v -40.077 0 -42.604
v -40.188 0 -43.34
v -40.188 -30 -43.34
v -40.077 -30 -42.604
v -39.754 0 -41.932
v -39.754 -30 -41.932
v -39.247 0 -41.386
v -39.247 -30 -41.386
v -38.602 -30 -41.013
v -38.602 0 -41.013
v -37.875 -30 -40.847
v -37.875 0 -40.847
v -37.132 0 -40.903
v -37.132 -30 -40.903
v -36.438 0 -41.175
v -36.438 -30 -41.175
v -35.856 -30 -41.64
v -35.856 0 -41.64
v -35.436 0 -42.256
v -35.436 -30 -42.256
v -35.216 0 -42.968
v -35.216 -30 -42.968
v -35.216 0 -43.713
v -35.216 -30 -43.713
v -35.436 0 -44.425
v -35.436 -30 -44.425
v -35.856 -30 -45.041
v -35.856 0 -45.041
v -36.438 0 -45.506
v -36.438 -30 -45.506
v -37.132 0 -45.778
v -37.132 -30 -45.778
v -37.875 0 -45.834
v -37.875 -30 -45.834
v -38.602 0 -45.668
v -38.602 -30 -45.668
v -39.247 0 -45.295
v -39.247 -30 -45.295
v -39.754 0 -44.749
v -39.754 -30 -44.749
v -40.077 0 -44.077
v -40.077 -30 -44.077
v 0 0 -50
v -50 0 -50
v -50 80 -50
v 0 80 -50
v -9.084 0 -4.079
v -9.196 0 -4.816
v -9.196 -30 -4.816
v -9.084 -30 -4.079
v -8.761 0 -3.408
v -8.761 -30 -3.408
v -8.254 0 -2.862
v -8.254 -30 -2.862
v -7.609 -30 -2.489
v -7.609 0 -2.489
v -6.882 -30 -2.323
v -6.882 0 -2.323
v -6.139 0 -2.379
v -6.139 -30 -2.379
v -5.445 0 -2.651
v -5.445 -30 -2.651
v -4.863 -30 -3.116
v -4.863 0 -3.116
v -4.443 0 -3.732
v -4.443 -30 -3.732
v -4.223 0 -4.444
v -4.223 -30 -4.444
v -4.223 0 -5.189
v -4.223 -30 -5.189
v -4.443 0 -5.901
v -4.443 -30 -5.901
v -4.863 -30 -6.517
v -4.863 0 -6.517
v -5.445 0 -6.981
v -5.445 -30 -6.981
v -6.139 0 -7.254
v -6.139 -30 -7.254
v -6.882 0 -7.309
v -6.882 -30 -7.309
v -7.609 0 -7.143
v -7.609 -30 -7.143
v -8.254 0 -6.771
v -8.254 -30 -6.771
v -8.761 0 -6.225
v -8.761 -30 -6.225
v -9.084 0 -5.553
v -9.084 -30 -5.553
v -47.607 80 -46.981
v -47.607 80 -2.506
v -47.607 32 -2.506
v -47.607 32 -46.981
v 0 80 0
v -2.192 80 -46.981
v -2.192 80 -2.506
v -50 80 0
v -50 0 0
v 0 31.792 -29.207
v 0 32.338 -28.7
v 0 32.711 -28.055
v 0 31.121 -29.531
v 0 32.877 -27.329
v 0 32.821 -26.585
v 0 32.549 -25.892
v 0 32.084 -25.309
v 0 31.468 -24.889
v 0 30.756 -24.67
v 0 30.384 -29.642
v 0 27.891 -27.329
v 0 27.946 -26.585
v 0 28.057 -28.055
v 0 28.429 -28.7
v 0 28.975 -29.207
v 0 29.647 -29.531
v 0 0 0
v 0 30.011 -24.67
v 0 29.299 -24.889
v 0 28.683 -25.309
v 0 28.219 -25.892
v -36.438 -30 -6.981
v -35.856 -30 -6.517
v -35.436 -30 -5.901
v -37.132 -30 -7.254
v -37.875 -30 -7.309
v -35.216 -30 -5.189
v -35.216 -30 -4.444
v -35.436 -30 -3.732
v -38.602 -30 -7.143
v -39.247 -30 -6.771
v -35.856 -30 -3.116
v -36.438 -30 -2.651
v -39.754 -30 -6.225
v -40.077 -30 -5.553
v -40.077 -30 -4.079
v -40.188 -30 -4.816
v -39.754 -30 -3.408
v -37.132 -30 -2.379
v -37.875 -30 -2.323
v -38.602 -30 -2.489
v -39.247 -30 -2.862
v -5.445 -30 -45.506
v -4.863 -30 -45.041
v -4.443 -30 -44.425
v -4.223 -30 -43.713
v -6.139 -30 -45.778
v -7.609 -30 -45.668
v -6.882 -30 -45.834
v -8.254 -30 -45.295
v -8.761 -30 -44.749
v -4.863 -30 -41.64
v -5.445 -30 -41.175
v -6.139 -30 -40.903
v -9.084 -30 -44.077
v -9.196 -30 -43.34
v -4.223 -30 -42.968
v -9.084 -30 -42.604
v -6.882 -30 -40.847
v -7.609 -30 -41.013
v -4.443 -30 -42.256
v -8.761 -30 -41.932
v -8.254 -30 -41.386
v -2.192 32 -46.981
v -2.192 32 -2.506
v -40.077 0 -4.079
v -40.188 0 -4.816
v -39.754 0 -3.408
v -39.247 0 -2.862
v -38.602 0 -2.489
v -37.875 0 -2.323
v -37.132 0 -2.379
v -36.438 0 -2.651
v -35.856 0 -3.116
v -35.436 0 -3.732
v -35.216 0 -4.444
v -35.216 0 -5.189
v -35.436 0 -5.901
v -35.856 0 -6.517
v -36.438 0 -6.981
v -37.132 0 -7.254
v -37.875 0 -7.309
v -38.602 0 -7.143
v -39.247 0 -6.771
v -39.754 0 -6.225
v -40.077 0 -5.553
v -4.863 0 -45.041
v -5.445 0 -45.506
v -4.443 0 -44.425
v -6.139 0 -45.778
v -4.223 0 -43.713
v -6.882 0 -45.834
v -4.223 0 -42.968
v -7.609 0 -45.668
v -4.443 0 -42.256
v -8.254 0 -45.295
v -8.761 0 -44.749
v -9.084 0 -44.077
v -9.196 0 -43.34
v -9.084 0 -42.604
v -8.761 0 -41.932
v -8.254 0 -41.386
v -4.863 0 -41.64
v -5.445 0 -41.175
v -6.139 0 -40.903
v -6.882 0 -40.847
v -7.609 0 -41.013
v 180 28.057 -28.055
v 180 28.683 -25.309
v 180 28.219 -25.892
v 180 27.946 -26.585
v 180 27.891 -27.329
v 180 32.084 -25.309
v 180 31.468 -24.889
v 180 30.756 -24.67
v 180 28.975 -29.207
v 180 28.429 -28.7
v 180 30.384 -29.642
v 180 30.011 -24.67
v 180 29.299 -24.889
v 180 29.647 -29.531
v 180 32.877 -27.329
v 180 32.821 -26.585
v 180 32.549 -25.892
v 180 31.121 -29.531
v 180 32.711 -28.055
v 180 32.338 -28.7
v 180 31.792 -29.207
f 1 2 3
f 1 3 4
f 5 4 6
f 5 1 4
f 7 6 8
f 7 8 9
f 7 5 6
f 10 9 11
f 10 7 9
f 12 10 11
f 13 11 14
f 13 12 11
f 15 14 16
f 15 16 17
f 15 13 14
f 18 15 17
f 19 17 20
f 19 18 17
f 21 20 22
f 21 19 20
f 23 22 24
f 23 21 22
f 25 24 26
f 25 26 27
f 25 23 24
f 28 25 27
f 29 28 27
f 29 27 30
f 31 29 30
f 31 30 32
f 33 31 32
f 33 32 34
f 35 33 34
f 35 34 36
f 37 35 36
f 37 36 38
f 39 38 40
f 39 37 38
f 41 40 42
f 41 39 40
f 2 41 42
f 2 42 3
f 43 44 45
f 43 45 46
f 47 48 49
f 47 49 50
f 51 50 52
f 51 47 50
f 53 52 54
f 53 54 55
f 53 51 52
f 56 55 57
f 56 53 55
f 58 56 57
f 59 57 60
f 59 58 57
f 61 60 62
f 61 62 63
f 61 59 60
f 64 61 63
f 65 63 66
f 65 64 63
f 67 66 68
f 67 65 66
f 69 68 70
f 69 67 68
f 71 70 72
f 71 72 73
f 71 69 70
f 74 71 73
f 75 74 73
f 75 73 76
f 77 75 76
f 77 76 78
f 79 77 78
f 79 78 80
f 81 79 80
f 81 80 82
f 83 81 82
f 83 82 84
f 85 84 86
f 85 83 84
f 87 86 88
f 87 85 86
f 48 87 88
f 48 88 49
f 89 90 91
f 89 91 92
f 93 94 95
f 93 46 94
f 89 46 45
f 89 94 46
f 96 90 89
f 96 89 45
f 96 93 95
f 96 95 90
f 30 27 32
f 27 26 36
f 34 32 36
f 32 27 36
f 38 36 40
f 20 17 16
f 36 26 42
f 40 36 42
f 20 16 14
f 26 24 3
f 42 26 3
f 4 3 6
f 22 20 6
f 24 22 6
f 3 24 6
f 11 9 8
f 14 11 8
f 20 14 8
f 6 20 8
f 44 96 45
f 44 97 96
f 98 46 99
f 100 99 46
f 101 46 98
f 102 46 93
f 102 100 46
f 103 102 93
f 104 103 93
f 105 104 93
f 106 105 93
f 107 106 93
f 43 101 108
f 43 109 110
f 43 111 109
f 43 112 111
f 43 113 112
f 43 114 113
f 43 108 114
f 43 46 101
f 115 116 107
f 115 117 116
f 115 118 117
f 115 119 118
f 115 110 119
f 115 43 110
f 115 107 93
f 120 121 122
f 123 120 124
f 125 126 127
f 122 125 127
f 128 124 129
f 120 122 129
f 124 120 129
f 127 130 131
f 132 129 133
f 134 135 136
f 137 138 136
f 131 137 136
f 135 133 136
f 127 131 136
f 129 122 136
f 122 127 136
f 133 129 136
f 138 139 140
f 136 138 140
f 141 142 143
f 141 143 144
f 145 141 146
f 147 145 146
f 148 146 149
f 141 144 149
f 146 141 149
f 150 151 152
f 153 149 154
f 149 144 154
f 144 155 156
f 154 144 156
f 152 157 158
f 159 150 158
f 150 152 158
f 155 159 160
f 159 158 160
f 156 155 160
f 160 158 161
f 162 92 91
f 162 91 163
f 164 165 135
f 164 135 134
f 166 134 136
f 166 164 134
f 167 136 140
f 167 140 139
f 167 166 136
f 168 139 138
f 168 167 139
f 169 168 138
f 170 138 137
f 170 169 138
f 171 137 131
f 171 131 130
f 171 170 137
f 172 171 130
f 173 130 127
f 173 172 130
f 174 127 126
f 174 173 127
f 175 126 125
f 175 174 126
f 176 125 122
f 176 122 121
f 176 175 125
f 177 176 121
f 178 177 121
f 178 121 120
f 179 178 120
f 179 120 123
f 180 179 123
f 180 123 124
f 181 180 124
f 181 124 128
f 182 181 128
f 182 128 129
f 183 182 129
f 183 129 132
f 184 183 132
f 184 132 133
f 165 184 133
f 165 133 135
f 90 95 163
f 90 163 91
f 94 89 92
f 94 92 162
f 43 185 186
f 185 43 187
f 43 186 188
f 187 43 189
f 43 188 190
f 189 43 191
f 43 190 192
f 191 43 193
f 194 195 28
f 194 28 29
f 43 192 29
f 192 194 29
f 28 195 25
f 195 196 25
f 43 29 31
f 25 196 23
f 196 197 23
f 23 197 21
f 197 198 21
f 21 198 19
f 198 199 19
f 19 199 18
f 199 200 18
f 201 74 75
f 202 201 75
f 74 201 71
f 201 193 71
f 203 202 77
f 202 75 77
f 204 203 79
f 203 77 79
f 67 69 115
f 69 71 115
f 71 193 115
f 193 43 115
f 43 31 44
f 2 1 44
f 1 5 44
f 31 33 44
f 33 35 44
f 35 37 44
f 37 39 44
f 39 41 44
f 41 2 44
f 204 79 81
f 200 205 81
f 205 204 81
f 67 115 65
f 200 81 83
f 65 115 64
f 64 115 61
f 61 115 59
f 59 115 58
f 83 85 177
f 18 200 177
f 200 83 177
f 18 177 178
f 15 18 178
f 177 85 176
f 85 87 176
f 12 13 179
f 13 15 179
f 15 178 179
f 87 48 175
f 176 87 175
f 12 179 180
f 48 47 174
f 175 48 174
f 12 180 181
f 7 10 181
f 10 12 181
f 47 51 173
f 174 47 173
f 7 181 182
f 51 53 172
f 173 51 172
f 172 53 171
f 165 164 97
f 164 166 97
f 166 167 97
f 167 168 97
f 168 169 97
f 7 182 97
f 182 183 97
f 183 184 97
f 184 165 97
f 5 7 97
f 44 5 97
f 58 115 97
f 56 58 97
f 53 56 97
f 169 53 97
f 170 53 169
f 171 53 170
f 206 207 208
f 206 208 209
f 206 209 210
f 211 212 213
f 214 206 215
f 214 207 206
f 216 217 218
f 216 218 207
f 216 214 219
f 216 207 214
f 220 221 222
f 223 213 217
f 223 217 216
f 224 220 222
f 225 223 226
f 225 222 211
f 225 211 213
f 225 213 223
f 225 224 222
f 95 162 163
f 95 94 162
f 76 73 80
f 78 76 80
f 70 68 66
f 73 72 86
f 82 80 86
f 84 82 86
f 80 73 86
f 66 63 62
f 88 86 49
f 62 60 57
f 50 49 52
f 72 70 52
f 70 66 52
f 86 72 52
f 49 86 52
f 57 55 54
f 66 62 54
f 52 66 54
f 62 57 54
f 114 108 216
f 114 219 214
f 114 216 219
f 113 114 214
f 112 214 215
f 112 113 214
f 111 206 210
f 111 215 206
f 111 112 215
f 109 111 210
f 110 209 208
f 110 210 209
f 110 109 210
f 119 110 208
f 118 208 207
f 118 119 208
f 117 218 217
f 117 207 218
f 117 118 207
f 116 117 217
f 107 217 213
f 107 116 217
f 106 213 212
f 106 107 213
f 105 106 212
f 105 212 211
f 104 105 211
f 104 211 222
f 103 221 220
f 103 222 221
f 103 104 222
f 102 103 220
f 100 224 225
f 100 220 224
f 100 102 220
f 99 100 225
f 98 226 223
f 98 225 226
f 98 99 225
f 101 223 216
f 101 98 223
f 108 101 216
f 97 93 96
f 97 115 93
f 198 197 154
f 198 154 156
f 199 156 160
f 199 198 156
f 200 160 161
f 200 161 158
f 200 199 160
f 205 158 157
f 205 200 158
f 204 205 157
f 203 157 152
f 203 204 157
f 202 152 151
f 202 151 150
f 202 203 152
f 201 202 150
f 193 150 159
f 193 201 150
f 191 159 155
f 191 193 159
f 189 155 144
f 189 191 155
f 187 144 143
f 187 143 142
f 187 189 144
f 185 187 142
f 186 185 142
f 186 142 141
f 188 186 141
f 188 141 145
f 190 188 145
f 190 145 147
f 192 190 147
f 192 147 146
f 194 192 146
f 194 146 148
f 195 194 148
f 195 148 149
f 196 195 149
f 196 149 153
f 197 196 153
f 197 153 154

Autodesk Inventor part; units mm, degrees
ref_plane "YZ Plane" through (0, 0, 0) normal (1, 0, 0) x (0, 1, 0)
ref_plane "XZ Plane" through (0, 0, 0) normal (0, 1, 0) x (-1, 0, 0)
ref_plane "XY Plane" through (0, 0, 0) normal (0, 0, 1) x (1, 0, 0)
sketch "Sketch1" plane through (0, 0, 0) normal (0, 1, 0) x (-1, 0, 0)
  line L0 (0, 0) -> (50, 0)
  line L1 (50, 0) -> (50, -50)
  line L2 (50, -50) -> (0, -50)
  line L3 (0, -50) -> (0, 0)
  circle A0 centre (37.6883, -4.8163) radius 2.5
  circle A1 centre (37.6883, -43.3405) radius 2.5
  circle A2 centre (6.6955, -43.3405) radius 2.5
  circle A3 centre (6.6955, -4.8163) radius 2.5
  dimension "d0" = 50
  dimension "d1" = 50
  dimension "d6" = 5
  dimension "d9" = 5
  dimension "d10" = 5
  dimension "d11" = 5
  dimension "d20" = 25.9928
  dimension "d21" = 38.5242
extrude "Extrusion1" add sketch "Sketch1" along normal blind 80 contours L0 L1 L2 L3 | A0 | A1 | A2 | A3
sketch "Sketch2" plane through (0, 80, 0) normal (0, 1, 0) x (1, 0, 0)
  line L0 (-47.6071, 46.9807) -> (-2.1924, 46.9807)
  line L1 (-2.1924, 46.9807) -> (-2.1924, 2.5056)
  line L2 (-2.1924, 2.5056) -> (-47.6071, 2.5056)
  line L3 (-47.6071, 2.5056) -> (-47.6071, 46.9807)
  point P0 (0, 0)
extrude "Extrusion2" cut sketch "Sketch2" against normal blind 48
extrude "Extrusion3" add sketch "Sketch1" against normal blind 30 contours A0 | A1 | A2 | A3
sketch "Sketch6" plane through (0, 0, 0) normal (1, 0, 0) x (0, 0, -1)
  circle A0 centre (27.1417, 30.3837) radius 2.5
  point P0 (0, 0)
  dimension "d22" = 5
extrude "Extrusion6" add sketch "Sketch6" along normal blind 180
properties part number "Water tank"
